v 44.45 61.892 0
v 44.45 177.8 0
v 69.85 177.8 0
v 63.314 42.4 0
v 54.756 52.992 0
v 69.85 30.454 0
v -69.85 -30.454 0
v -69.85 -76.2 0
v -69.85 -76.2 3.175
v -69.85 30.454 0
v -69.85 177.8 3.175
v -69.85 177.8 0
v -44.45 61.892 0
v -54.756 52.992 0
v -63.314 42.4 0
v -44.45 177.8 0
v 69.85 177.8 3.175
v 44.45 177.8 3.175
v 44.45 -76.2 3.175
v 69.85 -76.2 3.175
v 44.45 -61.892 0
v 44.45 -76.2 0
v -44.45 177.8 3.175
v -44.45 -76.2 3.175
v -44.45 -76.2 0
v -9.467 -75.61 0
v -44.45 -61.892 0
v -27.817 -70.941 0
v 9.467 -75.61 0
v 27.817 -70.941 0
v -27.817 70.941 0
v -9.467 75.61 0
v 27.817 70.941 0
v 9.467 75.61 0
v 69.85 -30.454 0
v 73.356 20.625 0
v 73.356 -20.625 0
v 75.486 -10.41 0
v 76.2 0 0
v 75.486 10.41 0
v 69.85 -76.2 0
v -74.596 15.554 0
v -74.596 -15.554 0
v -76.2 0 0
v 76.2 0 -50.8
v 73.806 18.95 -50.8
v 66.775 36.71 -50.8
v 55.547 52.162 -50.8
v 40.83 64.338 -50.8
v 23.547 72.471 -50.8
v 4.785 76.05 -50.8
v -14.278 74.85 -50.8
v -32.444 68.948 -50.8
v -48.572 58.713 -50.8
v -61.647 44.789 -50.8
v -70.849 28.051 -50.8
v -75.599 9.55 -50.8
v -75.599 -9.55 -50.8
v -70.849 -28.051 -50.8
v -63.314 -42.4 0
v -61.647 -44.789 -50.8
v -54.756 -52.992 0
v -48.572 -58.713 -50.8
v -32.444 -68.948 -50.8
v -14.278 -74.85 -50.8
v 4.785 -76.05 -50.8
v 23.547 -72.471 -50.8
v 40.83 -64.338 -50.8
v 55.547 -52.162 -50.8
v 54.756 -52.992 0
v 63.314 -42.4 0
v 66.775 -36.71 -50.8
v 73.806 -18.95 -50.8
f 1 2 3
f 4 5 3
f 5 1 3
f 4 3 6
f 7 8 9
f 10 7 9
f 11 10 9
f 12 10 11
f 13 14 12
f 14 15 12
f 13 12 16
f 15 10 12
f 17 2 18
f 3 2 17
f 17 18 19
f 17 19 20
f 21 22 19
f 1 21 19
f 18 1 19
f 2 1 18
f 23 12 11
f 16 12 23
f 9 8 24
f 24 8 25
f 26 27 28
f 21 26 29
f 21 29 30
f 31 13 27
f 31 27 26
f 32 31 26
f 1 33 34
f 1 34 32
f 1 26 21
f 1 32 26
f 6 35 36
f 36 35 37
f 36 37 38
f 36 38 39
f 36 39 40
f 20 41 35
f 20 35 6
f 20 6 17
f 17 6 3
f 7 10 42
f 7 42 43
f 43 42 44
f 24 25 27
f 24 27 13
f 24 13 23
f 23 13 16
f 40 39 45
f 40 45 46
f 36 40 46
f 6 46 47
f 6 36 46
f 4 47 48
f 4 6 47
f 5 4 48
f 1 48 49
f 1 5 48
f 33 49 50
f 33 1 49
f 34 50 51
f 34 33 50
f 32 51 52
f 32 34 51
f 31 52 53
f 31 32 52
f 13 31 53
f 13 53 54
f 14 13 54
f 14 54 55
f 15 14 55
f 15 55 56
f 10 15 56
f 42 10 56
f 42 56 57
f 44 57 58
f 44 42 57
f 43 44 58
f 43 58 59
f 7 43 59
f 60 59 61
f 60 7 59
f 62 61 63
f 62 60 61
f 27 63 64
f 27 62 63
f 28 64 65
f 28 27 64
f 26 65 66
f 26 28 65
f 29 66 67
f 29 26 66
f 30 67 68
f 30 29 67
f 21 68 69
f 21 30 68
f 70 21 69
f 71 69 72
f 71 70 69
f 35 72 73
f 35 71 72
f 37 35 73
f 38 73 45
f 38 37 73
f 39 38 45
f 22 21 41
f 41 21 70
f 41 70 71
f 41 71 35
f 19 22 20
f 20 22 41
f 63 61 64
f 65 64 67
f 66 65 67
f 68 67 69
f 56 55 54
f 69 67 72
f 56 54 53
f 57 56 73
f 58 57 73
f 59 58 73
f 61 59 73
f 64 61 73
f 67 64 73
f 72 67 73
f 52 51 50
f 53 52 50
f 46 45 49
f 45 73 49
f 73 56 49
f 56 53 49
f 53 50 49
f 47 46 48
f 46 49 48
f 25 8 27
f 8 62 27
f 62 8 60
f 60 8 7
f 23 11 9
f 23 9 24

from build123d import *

# Parameters (mm, degrees)
F0_R     = 76.2
F1_DEPTH = 50.8
F2_W     = 25.4
F2_H     = 254
F3_DEPTH = 3.175


with BuildPart() as f1:
    # F0 (on Top) → F1 (new body)
    with BuildSketch(Plane.XY):
        Circle(F0_R)
    extrude(amount=-F1_DEPTH)

    # F2 (on Top) → F3 (join)
    with BuildSketch(Plane.XY):
        with Locations((-57.15, 50.8)):
            Rectangle(F2_W, F2_H)
        with Locations((57.15, 50.8)):
            Rectangle(F2_W, F2_H)
    extrude(amount=F3_DEPTH)


solid = f1.part
